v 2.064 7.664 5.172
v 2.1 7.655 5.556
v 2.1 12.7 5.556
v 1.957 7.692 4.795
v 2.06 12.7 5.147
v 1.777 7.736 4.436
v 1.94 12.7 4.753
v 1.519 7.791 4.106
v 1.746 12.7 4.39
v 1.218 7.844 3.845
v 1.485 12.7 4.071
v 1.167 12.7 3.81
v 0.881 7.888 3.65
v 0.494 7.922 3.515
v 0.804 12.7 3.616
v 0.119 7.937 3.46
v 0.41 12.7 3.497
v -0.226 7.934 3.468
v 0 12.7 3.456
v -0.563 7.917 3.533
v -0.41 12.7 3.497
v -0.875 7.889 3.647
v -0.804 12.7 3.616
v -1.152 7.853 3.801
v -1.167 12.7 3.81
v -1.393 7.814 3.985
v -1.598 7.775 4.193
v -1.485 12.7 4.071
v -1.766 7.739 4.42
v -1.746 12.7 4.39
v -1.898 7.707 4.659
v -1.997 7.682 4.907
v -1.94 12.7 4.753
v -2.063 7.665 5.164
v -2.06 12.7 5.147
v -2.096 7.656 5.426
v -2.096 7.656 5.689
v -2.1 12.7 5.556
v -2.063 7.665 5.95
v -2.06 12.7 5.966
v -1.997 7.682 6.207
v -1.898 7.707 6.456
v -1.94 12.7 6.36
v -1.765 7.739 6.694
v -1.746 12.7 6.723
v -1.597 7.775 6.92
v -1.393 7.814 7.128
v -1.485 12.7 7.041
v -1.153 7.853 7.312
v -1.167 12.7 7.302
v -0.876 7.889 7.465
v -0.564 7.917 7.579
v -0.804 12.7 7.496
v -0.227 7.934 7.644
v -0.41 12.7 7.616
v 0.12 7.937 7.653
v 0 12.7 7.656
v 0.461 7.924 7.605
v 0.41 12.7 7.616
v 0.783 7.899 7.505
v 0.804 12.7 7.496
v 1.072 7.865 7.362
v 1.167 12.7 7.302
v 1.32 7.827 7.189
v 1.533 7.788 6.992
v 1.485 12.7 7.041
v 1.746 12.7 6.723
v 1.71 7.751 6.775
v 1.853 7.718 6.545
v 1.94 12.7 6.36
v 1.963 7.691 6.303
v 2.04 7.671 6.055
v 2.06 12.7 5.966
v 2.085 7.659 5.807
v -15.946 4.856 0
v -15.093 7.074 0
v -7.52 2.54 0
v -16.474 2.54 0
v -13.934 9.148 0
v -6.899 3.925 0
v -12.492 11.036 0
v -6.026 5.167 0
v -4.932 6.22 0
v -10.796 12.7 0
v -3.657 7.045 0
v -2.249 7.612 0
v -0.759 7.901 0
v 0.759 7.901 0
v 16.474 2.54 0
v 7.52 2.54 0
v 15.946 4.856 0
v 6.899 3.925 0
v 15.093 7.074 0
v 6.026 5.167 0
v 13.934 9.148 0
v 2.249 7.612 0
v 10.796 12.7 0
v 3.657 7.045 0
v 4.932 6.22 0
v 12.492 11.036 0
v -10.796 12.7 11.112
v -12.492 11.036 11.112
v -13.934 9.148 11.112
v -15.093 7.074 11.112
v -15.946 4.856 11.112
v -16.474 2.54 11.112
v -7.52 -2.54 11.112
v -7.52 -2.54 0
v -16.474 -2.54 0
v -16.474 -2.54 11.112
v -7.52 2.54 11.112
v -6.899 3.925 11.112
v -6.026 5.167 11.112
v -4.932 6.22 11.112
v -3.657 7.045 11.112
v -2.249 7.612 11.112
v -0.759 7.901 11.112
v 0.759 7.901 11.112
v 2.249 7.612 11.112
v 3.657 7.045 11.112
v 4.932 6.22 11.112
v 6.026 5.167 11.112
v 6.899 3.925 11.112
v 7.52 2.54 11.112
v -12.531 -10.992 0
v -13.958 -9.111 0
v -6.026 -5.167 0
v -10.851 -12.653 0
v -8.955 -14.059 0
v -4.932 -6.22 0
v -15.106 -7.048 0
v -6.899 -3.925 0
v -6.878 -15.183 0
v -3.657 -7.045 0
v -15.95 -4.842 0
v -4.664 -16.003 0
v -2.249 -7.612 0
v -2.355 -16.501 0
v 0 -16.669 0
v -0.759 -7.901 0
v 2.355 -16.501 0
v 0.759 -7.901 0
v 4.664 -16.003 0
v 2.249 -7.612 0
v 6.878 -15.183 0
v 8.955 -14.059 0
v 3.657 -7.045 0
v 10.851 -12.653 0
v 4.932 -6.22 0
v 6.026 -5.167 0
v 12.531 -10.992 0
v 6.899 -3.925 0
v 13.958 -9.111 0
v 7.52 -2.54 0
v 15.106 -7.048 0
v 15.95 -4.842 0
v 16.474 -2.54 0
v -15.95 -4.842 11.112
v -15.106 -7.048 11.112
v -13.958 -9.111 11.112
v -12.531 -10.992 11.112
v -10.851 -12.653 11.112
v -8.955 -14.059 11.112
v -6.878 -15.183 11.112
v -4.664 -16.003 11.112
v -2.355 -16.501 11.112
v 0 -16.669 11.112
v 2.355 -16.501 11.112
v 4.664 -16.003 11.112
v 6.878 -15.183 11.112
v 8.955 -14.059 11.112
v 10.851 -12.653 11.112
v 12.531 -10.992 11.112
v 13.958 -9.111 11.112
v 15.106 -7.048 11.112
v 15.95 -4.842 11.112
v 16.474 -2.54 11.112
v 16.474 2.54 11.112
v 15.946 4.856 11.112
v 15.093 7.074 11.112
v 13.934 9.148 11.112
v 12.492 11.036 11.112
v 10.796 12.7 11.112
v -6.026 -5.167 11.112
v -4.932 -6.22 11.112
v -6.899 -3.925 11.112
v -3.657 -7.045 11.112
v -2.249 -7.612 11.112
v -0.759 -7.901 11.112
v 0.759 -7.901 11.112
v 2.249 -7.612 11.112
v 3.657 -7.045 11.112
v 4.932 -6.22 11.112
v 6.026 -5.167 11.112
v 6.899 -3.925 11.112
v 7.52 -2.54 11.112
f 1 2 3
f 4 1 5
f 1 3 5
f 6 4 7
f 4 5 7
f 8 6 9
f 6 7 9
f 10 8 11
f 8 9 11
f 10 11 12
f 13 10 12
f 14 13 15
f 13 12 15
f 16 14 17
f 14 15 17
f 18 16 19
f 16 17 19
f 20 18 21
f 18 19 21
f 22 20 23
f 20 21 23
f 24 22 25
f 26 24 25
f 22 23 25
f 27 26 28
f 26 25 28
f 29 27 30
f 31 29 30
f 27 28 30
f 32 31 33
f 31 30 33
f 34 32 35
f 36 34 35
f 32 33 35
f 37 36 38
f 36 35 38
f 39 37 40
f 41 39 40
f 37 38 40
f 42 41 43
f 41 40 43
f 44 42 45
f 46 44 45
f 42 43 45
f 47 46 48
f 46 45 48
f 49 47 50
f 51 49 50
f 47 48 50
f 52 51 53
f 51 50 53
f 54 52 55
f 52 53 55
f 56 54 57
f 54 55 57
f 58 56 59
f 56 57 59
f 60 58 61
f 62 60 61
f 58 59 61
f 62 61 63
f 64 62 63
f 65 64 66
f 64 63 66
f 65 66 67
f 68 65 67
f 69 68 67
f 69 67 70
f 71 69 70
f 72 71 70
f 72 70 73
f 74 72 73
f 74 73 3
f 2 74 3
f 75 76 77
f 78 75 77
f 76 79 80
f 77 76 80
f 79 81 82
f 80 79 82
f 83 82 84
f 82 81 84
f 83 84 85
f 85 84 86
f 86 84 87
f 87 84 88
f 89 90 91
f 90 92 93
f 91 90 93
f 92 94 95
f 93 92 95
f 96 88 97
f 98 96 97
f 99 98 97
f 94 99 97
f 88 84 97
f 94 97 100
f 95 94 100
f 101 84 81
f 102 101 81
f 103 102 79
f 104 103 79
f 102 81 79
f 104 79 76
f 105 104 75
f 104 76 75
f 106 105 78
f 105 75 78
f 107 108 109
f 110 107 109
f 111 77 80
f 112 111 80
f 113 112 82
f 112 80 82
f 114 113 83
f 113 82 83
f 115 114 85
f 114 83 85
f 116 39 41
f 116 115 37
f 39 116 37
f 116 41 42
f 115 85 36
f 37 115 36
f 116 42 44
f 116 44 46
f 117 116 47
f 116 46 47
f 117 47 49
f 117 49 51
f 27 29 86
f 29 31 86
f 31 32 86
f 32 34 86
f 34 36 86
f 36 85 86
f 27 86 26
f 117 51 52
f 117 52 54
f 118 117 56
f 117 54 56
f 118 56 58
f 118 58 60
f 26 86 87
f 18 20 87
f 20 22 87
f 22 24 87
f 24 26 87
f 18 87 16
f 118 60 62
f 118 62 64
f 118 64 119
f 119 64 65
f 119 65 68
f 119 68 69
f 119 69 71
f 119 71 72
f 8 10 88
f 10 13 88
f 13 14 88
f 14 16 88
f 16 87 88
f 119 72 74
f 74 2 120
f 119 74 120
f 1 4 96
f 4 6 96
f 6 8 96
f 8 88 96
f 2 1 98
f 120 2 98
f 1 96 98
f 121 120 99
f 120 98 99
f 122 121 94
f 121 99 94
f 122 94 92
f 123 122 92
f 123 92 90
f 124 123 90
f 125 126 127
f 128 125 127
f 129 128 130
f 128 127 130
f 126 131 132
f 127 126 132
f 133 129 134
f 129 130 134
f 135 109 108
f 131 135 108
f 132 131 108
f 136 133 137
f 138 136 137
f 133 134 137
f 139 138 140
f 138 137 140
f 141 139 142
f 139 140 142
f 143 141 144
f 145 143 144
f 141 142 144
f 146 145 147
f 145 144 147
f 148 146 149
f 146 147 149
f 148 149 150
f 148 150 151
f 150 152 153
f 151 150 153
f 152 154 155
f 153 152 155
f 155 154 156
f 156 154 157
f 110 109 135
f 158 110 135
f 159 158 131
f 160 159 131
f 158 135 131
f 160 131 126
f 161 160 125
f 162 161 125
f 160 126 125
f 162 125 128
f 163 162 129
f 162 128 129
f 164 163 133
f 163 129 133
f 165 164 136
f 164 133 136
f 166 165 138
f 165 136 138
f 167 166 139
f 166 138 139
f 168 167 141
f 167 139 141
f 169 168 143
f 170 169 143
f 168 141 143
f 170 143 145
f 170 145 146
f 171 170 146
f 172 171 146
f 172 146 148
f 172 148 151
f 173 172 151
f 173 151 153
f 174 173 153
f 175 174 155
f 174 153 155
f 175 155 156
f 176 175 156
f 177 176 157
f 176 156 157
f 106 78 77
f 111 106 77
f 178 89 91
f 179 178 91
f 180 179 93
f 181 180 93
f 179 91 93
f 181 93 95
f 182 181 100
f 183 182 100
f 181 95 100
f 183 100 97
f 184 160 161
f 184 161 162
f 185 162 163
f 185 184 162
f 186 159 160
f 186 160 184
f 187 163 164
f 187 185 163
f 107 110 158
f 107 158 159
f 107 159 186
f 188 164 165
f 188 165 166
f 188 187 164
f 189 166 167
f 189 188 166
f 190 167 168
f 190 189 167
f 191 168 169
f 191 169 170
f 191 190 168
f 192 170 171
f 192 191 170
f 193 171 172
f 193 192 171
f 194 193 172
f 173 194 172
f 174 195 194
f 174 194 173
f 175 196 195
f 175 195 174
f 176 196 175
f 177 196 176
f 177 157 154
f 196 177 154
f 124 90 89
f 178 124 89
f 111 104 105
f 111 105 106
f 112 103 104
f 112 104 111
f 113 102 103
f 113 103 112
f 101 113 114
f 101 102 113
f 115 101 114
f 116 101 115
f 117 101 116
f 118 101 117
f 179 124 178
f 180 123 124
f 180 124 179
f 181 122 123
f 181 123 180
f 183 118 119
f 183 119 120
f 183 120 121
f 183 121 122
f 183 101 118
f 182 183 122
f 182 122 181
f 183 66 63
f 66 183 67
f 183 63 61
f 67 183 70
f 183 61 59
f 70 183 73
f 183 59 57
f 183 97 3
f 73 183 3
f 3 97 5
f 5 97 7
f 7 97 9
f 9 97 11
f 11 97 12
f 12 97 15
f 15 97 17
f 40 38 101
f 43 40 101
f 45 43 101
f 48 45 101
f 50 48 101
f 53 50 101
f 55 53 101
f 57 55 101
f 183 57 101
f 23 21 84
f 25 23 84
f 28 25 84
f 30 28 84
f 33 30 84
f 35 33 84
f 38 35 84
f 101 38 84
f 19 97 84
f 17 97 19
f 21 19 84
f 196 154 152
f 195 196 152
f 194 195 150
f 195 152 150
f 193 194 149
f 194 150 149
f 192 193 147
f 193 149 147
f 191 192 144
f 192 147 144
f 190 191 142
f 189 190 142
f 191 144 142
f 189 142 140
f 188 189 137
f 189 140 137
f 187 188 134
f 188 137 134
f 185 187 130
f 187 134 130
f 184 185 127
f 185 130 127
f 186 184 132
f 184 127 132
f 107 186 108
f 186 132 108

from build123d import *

# Parameters (mm, degrees)
BOSS_EXTRUDE1_DEPTH           = 11.1125
BOSS_EXTRUDE1_2_DEPTH         = 11.1125
M5X0_8_TAPPED_HOLE1_OUTLINE_W = 2.1
M5X0_8_TAPPED_HOLE1_OUTLINE_H = 5.045375368


# Read off the part's stored shape, not the designer's step: M5x0.8 Tapped Hole1
with BuildPart() as part:
    # Sketch1 → Boss-Extrude1 (new body)
    with BuildSketch(Plane.XY):
        with BuildLine():
            ThreePointArc((-7.520126744, 2.54), (0, 7.9375), (7.520126744, 2.54))
            Line((7.520126744, 2.54), (16.474089552, 2.54))
            ThreePointArc((16.474089552, 2.54), (14.550708782, 8.131672676), (10.796167216, 12.7))
            Line((10.796167216, 12.7), (-10.796167216, 12.7))
            ThreePointArc((-10.796167216, 12.7), (-14.550708782, 8.131672676), (-16.474089552, 2.54))
            Line((-16.474089552, 2.54), (-7.520126744, 2.54))
        make_face()
    extrude(amount=BOSS_EXTRUDE1_DEPTH)

    # M5x0.8 Tapped Hole1 outline → M5x0.8 Tapped Hole1 (revolve, cut)
    with BuildSketch(Plane.XY.offset(5.55625)):
        with Locations((1.05, 10.177312316)):
            Rectangle(M5X0_8_TAPPED_HOLE1_OUTLINE_W, M5X0_8_TAPPED_HOLE1_OUTLINE_H)
    revolve(axis=Axis((0, 0, 5.55625), (0, 1, 0)), mode=Mode.SUBTRACT)


with BuildPart() as body_2:
    # Sketch1 → Boss-Extrude1 2 (new body)
    with BuildSketch(Plane.XY):
        with BuildLine():
            Line((16.474089552, -2.54), (7.520126744, -2.54))
            ThreePointArc((7.520126744, -2.54), (0, -7.9375), (-7.520126744, -2.54))
            Line((-7.520126744, -2.54), (-16.474089552, -2.54))
            ThreePointArc((-16.474089552, -2.54), (0, -16.66875), (16.474089552, -2.54))
        make_face()
    extrude(amount=BOSS_EXTRUDE1_2_DEPTH)


solid = Compound([part.part, body_2.part])
